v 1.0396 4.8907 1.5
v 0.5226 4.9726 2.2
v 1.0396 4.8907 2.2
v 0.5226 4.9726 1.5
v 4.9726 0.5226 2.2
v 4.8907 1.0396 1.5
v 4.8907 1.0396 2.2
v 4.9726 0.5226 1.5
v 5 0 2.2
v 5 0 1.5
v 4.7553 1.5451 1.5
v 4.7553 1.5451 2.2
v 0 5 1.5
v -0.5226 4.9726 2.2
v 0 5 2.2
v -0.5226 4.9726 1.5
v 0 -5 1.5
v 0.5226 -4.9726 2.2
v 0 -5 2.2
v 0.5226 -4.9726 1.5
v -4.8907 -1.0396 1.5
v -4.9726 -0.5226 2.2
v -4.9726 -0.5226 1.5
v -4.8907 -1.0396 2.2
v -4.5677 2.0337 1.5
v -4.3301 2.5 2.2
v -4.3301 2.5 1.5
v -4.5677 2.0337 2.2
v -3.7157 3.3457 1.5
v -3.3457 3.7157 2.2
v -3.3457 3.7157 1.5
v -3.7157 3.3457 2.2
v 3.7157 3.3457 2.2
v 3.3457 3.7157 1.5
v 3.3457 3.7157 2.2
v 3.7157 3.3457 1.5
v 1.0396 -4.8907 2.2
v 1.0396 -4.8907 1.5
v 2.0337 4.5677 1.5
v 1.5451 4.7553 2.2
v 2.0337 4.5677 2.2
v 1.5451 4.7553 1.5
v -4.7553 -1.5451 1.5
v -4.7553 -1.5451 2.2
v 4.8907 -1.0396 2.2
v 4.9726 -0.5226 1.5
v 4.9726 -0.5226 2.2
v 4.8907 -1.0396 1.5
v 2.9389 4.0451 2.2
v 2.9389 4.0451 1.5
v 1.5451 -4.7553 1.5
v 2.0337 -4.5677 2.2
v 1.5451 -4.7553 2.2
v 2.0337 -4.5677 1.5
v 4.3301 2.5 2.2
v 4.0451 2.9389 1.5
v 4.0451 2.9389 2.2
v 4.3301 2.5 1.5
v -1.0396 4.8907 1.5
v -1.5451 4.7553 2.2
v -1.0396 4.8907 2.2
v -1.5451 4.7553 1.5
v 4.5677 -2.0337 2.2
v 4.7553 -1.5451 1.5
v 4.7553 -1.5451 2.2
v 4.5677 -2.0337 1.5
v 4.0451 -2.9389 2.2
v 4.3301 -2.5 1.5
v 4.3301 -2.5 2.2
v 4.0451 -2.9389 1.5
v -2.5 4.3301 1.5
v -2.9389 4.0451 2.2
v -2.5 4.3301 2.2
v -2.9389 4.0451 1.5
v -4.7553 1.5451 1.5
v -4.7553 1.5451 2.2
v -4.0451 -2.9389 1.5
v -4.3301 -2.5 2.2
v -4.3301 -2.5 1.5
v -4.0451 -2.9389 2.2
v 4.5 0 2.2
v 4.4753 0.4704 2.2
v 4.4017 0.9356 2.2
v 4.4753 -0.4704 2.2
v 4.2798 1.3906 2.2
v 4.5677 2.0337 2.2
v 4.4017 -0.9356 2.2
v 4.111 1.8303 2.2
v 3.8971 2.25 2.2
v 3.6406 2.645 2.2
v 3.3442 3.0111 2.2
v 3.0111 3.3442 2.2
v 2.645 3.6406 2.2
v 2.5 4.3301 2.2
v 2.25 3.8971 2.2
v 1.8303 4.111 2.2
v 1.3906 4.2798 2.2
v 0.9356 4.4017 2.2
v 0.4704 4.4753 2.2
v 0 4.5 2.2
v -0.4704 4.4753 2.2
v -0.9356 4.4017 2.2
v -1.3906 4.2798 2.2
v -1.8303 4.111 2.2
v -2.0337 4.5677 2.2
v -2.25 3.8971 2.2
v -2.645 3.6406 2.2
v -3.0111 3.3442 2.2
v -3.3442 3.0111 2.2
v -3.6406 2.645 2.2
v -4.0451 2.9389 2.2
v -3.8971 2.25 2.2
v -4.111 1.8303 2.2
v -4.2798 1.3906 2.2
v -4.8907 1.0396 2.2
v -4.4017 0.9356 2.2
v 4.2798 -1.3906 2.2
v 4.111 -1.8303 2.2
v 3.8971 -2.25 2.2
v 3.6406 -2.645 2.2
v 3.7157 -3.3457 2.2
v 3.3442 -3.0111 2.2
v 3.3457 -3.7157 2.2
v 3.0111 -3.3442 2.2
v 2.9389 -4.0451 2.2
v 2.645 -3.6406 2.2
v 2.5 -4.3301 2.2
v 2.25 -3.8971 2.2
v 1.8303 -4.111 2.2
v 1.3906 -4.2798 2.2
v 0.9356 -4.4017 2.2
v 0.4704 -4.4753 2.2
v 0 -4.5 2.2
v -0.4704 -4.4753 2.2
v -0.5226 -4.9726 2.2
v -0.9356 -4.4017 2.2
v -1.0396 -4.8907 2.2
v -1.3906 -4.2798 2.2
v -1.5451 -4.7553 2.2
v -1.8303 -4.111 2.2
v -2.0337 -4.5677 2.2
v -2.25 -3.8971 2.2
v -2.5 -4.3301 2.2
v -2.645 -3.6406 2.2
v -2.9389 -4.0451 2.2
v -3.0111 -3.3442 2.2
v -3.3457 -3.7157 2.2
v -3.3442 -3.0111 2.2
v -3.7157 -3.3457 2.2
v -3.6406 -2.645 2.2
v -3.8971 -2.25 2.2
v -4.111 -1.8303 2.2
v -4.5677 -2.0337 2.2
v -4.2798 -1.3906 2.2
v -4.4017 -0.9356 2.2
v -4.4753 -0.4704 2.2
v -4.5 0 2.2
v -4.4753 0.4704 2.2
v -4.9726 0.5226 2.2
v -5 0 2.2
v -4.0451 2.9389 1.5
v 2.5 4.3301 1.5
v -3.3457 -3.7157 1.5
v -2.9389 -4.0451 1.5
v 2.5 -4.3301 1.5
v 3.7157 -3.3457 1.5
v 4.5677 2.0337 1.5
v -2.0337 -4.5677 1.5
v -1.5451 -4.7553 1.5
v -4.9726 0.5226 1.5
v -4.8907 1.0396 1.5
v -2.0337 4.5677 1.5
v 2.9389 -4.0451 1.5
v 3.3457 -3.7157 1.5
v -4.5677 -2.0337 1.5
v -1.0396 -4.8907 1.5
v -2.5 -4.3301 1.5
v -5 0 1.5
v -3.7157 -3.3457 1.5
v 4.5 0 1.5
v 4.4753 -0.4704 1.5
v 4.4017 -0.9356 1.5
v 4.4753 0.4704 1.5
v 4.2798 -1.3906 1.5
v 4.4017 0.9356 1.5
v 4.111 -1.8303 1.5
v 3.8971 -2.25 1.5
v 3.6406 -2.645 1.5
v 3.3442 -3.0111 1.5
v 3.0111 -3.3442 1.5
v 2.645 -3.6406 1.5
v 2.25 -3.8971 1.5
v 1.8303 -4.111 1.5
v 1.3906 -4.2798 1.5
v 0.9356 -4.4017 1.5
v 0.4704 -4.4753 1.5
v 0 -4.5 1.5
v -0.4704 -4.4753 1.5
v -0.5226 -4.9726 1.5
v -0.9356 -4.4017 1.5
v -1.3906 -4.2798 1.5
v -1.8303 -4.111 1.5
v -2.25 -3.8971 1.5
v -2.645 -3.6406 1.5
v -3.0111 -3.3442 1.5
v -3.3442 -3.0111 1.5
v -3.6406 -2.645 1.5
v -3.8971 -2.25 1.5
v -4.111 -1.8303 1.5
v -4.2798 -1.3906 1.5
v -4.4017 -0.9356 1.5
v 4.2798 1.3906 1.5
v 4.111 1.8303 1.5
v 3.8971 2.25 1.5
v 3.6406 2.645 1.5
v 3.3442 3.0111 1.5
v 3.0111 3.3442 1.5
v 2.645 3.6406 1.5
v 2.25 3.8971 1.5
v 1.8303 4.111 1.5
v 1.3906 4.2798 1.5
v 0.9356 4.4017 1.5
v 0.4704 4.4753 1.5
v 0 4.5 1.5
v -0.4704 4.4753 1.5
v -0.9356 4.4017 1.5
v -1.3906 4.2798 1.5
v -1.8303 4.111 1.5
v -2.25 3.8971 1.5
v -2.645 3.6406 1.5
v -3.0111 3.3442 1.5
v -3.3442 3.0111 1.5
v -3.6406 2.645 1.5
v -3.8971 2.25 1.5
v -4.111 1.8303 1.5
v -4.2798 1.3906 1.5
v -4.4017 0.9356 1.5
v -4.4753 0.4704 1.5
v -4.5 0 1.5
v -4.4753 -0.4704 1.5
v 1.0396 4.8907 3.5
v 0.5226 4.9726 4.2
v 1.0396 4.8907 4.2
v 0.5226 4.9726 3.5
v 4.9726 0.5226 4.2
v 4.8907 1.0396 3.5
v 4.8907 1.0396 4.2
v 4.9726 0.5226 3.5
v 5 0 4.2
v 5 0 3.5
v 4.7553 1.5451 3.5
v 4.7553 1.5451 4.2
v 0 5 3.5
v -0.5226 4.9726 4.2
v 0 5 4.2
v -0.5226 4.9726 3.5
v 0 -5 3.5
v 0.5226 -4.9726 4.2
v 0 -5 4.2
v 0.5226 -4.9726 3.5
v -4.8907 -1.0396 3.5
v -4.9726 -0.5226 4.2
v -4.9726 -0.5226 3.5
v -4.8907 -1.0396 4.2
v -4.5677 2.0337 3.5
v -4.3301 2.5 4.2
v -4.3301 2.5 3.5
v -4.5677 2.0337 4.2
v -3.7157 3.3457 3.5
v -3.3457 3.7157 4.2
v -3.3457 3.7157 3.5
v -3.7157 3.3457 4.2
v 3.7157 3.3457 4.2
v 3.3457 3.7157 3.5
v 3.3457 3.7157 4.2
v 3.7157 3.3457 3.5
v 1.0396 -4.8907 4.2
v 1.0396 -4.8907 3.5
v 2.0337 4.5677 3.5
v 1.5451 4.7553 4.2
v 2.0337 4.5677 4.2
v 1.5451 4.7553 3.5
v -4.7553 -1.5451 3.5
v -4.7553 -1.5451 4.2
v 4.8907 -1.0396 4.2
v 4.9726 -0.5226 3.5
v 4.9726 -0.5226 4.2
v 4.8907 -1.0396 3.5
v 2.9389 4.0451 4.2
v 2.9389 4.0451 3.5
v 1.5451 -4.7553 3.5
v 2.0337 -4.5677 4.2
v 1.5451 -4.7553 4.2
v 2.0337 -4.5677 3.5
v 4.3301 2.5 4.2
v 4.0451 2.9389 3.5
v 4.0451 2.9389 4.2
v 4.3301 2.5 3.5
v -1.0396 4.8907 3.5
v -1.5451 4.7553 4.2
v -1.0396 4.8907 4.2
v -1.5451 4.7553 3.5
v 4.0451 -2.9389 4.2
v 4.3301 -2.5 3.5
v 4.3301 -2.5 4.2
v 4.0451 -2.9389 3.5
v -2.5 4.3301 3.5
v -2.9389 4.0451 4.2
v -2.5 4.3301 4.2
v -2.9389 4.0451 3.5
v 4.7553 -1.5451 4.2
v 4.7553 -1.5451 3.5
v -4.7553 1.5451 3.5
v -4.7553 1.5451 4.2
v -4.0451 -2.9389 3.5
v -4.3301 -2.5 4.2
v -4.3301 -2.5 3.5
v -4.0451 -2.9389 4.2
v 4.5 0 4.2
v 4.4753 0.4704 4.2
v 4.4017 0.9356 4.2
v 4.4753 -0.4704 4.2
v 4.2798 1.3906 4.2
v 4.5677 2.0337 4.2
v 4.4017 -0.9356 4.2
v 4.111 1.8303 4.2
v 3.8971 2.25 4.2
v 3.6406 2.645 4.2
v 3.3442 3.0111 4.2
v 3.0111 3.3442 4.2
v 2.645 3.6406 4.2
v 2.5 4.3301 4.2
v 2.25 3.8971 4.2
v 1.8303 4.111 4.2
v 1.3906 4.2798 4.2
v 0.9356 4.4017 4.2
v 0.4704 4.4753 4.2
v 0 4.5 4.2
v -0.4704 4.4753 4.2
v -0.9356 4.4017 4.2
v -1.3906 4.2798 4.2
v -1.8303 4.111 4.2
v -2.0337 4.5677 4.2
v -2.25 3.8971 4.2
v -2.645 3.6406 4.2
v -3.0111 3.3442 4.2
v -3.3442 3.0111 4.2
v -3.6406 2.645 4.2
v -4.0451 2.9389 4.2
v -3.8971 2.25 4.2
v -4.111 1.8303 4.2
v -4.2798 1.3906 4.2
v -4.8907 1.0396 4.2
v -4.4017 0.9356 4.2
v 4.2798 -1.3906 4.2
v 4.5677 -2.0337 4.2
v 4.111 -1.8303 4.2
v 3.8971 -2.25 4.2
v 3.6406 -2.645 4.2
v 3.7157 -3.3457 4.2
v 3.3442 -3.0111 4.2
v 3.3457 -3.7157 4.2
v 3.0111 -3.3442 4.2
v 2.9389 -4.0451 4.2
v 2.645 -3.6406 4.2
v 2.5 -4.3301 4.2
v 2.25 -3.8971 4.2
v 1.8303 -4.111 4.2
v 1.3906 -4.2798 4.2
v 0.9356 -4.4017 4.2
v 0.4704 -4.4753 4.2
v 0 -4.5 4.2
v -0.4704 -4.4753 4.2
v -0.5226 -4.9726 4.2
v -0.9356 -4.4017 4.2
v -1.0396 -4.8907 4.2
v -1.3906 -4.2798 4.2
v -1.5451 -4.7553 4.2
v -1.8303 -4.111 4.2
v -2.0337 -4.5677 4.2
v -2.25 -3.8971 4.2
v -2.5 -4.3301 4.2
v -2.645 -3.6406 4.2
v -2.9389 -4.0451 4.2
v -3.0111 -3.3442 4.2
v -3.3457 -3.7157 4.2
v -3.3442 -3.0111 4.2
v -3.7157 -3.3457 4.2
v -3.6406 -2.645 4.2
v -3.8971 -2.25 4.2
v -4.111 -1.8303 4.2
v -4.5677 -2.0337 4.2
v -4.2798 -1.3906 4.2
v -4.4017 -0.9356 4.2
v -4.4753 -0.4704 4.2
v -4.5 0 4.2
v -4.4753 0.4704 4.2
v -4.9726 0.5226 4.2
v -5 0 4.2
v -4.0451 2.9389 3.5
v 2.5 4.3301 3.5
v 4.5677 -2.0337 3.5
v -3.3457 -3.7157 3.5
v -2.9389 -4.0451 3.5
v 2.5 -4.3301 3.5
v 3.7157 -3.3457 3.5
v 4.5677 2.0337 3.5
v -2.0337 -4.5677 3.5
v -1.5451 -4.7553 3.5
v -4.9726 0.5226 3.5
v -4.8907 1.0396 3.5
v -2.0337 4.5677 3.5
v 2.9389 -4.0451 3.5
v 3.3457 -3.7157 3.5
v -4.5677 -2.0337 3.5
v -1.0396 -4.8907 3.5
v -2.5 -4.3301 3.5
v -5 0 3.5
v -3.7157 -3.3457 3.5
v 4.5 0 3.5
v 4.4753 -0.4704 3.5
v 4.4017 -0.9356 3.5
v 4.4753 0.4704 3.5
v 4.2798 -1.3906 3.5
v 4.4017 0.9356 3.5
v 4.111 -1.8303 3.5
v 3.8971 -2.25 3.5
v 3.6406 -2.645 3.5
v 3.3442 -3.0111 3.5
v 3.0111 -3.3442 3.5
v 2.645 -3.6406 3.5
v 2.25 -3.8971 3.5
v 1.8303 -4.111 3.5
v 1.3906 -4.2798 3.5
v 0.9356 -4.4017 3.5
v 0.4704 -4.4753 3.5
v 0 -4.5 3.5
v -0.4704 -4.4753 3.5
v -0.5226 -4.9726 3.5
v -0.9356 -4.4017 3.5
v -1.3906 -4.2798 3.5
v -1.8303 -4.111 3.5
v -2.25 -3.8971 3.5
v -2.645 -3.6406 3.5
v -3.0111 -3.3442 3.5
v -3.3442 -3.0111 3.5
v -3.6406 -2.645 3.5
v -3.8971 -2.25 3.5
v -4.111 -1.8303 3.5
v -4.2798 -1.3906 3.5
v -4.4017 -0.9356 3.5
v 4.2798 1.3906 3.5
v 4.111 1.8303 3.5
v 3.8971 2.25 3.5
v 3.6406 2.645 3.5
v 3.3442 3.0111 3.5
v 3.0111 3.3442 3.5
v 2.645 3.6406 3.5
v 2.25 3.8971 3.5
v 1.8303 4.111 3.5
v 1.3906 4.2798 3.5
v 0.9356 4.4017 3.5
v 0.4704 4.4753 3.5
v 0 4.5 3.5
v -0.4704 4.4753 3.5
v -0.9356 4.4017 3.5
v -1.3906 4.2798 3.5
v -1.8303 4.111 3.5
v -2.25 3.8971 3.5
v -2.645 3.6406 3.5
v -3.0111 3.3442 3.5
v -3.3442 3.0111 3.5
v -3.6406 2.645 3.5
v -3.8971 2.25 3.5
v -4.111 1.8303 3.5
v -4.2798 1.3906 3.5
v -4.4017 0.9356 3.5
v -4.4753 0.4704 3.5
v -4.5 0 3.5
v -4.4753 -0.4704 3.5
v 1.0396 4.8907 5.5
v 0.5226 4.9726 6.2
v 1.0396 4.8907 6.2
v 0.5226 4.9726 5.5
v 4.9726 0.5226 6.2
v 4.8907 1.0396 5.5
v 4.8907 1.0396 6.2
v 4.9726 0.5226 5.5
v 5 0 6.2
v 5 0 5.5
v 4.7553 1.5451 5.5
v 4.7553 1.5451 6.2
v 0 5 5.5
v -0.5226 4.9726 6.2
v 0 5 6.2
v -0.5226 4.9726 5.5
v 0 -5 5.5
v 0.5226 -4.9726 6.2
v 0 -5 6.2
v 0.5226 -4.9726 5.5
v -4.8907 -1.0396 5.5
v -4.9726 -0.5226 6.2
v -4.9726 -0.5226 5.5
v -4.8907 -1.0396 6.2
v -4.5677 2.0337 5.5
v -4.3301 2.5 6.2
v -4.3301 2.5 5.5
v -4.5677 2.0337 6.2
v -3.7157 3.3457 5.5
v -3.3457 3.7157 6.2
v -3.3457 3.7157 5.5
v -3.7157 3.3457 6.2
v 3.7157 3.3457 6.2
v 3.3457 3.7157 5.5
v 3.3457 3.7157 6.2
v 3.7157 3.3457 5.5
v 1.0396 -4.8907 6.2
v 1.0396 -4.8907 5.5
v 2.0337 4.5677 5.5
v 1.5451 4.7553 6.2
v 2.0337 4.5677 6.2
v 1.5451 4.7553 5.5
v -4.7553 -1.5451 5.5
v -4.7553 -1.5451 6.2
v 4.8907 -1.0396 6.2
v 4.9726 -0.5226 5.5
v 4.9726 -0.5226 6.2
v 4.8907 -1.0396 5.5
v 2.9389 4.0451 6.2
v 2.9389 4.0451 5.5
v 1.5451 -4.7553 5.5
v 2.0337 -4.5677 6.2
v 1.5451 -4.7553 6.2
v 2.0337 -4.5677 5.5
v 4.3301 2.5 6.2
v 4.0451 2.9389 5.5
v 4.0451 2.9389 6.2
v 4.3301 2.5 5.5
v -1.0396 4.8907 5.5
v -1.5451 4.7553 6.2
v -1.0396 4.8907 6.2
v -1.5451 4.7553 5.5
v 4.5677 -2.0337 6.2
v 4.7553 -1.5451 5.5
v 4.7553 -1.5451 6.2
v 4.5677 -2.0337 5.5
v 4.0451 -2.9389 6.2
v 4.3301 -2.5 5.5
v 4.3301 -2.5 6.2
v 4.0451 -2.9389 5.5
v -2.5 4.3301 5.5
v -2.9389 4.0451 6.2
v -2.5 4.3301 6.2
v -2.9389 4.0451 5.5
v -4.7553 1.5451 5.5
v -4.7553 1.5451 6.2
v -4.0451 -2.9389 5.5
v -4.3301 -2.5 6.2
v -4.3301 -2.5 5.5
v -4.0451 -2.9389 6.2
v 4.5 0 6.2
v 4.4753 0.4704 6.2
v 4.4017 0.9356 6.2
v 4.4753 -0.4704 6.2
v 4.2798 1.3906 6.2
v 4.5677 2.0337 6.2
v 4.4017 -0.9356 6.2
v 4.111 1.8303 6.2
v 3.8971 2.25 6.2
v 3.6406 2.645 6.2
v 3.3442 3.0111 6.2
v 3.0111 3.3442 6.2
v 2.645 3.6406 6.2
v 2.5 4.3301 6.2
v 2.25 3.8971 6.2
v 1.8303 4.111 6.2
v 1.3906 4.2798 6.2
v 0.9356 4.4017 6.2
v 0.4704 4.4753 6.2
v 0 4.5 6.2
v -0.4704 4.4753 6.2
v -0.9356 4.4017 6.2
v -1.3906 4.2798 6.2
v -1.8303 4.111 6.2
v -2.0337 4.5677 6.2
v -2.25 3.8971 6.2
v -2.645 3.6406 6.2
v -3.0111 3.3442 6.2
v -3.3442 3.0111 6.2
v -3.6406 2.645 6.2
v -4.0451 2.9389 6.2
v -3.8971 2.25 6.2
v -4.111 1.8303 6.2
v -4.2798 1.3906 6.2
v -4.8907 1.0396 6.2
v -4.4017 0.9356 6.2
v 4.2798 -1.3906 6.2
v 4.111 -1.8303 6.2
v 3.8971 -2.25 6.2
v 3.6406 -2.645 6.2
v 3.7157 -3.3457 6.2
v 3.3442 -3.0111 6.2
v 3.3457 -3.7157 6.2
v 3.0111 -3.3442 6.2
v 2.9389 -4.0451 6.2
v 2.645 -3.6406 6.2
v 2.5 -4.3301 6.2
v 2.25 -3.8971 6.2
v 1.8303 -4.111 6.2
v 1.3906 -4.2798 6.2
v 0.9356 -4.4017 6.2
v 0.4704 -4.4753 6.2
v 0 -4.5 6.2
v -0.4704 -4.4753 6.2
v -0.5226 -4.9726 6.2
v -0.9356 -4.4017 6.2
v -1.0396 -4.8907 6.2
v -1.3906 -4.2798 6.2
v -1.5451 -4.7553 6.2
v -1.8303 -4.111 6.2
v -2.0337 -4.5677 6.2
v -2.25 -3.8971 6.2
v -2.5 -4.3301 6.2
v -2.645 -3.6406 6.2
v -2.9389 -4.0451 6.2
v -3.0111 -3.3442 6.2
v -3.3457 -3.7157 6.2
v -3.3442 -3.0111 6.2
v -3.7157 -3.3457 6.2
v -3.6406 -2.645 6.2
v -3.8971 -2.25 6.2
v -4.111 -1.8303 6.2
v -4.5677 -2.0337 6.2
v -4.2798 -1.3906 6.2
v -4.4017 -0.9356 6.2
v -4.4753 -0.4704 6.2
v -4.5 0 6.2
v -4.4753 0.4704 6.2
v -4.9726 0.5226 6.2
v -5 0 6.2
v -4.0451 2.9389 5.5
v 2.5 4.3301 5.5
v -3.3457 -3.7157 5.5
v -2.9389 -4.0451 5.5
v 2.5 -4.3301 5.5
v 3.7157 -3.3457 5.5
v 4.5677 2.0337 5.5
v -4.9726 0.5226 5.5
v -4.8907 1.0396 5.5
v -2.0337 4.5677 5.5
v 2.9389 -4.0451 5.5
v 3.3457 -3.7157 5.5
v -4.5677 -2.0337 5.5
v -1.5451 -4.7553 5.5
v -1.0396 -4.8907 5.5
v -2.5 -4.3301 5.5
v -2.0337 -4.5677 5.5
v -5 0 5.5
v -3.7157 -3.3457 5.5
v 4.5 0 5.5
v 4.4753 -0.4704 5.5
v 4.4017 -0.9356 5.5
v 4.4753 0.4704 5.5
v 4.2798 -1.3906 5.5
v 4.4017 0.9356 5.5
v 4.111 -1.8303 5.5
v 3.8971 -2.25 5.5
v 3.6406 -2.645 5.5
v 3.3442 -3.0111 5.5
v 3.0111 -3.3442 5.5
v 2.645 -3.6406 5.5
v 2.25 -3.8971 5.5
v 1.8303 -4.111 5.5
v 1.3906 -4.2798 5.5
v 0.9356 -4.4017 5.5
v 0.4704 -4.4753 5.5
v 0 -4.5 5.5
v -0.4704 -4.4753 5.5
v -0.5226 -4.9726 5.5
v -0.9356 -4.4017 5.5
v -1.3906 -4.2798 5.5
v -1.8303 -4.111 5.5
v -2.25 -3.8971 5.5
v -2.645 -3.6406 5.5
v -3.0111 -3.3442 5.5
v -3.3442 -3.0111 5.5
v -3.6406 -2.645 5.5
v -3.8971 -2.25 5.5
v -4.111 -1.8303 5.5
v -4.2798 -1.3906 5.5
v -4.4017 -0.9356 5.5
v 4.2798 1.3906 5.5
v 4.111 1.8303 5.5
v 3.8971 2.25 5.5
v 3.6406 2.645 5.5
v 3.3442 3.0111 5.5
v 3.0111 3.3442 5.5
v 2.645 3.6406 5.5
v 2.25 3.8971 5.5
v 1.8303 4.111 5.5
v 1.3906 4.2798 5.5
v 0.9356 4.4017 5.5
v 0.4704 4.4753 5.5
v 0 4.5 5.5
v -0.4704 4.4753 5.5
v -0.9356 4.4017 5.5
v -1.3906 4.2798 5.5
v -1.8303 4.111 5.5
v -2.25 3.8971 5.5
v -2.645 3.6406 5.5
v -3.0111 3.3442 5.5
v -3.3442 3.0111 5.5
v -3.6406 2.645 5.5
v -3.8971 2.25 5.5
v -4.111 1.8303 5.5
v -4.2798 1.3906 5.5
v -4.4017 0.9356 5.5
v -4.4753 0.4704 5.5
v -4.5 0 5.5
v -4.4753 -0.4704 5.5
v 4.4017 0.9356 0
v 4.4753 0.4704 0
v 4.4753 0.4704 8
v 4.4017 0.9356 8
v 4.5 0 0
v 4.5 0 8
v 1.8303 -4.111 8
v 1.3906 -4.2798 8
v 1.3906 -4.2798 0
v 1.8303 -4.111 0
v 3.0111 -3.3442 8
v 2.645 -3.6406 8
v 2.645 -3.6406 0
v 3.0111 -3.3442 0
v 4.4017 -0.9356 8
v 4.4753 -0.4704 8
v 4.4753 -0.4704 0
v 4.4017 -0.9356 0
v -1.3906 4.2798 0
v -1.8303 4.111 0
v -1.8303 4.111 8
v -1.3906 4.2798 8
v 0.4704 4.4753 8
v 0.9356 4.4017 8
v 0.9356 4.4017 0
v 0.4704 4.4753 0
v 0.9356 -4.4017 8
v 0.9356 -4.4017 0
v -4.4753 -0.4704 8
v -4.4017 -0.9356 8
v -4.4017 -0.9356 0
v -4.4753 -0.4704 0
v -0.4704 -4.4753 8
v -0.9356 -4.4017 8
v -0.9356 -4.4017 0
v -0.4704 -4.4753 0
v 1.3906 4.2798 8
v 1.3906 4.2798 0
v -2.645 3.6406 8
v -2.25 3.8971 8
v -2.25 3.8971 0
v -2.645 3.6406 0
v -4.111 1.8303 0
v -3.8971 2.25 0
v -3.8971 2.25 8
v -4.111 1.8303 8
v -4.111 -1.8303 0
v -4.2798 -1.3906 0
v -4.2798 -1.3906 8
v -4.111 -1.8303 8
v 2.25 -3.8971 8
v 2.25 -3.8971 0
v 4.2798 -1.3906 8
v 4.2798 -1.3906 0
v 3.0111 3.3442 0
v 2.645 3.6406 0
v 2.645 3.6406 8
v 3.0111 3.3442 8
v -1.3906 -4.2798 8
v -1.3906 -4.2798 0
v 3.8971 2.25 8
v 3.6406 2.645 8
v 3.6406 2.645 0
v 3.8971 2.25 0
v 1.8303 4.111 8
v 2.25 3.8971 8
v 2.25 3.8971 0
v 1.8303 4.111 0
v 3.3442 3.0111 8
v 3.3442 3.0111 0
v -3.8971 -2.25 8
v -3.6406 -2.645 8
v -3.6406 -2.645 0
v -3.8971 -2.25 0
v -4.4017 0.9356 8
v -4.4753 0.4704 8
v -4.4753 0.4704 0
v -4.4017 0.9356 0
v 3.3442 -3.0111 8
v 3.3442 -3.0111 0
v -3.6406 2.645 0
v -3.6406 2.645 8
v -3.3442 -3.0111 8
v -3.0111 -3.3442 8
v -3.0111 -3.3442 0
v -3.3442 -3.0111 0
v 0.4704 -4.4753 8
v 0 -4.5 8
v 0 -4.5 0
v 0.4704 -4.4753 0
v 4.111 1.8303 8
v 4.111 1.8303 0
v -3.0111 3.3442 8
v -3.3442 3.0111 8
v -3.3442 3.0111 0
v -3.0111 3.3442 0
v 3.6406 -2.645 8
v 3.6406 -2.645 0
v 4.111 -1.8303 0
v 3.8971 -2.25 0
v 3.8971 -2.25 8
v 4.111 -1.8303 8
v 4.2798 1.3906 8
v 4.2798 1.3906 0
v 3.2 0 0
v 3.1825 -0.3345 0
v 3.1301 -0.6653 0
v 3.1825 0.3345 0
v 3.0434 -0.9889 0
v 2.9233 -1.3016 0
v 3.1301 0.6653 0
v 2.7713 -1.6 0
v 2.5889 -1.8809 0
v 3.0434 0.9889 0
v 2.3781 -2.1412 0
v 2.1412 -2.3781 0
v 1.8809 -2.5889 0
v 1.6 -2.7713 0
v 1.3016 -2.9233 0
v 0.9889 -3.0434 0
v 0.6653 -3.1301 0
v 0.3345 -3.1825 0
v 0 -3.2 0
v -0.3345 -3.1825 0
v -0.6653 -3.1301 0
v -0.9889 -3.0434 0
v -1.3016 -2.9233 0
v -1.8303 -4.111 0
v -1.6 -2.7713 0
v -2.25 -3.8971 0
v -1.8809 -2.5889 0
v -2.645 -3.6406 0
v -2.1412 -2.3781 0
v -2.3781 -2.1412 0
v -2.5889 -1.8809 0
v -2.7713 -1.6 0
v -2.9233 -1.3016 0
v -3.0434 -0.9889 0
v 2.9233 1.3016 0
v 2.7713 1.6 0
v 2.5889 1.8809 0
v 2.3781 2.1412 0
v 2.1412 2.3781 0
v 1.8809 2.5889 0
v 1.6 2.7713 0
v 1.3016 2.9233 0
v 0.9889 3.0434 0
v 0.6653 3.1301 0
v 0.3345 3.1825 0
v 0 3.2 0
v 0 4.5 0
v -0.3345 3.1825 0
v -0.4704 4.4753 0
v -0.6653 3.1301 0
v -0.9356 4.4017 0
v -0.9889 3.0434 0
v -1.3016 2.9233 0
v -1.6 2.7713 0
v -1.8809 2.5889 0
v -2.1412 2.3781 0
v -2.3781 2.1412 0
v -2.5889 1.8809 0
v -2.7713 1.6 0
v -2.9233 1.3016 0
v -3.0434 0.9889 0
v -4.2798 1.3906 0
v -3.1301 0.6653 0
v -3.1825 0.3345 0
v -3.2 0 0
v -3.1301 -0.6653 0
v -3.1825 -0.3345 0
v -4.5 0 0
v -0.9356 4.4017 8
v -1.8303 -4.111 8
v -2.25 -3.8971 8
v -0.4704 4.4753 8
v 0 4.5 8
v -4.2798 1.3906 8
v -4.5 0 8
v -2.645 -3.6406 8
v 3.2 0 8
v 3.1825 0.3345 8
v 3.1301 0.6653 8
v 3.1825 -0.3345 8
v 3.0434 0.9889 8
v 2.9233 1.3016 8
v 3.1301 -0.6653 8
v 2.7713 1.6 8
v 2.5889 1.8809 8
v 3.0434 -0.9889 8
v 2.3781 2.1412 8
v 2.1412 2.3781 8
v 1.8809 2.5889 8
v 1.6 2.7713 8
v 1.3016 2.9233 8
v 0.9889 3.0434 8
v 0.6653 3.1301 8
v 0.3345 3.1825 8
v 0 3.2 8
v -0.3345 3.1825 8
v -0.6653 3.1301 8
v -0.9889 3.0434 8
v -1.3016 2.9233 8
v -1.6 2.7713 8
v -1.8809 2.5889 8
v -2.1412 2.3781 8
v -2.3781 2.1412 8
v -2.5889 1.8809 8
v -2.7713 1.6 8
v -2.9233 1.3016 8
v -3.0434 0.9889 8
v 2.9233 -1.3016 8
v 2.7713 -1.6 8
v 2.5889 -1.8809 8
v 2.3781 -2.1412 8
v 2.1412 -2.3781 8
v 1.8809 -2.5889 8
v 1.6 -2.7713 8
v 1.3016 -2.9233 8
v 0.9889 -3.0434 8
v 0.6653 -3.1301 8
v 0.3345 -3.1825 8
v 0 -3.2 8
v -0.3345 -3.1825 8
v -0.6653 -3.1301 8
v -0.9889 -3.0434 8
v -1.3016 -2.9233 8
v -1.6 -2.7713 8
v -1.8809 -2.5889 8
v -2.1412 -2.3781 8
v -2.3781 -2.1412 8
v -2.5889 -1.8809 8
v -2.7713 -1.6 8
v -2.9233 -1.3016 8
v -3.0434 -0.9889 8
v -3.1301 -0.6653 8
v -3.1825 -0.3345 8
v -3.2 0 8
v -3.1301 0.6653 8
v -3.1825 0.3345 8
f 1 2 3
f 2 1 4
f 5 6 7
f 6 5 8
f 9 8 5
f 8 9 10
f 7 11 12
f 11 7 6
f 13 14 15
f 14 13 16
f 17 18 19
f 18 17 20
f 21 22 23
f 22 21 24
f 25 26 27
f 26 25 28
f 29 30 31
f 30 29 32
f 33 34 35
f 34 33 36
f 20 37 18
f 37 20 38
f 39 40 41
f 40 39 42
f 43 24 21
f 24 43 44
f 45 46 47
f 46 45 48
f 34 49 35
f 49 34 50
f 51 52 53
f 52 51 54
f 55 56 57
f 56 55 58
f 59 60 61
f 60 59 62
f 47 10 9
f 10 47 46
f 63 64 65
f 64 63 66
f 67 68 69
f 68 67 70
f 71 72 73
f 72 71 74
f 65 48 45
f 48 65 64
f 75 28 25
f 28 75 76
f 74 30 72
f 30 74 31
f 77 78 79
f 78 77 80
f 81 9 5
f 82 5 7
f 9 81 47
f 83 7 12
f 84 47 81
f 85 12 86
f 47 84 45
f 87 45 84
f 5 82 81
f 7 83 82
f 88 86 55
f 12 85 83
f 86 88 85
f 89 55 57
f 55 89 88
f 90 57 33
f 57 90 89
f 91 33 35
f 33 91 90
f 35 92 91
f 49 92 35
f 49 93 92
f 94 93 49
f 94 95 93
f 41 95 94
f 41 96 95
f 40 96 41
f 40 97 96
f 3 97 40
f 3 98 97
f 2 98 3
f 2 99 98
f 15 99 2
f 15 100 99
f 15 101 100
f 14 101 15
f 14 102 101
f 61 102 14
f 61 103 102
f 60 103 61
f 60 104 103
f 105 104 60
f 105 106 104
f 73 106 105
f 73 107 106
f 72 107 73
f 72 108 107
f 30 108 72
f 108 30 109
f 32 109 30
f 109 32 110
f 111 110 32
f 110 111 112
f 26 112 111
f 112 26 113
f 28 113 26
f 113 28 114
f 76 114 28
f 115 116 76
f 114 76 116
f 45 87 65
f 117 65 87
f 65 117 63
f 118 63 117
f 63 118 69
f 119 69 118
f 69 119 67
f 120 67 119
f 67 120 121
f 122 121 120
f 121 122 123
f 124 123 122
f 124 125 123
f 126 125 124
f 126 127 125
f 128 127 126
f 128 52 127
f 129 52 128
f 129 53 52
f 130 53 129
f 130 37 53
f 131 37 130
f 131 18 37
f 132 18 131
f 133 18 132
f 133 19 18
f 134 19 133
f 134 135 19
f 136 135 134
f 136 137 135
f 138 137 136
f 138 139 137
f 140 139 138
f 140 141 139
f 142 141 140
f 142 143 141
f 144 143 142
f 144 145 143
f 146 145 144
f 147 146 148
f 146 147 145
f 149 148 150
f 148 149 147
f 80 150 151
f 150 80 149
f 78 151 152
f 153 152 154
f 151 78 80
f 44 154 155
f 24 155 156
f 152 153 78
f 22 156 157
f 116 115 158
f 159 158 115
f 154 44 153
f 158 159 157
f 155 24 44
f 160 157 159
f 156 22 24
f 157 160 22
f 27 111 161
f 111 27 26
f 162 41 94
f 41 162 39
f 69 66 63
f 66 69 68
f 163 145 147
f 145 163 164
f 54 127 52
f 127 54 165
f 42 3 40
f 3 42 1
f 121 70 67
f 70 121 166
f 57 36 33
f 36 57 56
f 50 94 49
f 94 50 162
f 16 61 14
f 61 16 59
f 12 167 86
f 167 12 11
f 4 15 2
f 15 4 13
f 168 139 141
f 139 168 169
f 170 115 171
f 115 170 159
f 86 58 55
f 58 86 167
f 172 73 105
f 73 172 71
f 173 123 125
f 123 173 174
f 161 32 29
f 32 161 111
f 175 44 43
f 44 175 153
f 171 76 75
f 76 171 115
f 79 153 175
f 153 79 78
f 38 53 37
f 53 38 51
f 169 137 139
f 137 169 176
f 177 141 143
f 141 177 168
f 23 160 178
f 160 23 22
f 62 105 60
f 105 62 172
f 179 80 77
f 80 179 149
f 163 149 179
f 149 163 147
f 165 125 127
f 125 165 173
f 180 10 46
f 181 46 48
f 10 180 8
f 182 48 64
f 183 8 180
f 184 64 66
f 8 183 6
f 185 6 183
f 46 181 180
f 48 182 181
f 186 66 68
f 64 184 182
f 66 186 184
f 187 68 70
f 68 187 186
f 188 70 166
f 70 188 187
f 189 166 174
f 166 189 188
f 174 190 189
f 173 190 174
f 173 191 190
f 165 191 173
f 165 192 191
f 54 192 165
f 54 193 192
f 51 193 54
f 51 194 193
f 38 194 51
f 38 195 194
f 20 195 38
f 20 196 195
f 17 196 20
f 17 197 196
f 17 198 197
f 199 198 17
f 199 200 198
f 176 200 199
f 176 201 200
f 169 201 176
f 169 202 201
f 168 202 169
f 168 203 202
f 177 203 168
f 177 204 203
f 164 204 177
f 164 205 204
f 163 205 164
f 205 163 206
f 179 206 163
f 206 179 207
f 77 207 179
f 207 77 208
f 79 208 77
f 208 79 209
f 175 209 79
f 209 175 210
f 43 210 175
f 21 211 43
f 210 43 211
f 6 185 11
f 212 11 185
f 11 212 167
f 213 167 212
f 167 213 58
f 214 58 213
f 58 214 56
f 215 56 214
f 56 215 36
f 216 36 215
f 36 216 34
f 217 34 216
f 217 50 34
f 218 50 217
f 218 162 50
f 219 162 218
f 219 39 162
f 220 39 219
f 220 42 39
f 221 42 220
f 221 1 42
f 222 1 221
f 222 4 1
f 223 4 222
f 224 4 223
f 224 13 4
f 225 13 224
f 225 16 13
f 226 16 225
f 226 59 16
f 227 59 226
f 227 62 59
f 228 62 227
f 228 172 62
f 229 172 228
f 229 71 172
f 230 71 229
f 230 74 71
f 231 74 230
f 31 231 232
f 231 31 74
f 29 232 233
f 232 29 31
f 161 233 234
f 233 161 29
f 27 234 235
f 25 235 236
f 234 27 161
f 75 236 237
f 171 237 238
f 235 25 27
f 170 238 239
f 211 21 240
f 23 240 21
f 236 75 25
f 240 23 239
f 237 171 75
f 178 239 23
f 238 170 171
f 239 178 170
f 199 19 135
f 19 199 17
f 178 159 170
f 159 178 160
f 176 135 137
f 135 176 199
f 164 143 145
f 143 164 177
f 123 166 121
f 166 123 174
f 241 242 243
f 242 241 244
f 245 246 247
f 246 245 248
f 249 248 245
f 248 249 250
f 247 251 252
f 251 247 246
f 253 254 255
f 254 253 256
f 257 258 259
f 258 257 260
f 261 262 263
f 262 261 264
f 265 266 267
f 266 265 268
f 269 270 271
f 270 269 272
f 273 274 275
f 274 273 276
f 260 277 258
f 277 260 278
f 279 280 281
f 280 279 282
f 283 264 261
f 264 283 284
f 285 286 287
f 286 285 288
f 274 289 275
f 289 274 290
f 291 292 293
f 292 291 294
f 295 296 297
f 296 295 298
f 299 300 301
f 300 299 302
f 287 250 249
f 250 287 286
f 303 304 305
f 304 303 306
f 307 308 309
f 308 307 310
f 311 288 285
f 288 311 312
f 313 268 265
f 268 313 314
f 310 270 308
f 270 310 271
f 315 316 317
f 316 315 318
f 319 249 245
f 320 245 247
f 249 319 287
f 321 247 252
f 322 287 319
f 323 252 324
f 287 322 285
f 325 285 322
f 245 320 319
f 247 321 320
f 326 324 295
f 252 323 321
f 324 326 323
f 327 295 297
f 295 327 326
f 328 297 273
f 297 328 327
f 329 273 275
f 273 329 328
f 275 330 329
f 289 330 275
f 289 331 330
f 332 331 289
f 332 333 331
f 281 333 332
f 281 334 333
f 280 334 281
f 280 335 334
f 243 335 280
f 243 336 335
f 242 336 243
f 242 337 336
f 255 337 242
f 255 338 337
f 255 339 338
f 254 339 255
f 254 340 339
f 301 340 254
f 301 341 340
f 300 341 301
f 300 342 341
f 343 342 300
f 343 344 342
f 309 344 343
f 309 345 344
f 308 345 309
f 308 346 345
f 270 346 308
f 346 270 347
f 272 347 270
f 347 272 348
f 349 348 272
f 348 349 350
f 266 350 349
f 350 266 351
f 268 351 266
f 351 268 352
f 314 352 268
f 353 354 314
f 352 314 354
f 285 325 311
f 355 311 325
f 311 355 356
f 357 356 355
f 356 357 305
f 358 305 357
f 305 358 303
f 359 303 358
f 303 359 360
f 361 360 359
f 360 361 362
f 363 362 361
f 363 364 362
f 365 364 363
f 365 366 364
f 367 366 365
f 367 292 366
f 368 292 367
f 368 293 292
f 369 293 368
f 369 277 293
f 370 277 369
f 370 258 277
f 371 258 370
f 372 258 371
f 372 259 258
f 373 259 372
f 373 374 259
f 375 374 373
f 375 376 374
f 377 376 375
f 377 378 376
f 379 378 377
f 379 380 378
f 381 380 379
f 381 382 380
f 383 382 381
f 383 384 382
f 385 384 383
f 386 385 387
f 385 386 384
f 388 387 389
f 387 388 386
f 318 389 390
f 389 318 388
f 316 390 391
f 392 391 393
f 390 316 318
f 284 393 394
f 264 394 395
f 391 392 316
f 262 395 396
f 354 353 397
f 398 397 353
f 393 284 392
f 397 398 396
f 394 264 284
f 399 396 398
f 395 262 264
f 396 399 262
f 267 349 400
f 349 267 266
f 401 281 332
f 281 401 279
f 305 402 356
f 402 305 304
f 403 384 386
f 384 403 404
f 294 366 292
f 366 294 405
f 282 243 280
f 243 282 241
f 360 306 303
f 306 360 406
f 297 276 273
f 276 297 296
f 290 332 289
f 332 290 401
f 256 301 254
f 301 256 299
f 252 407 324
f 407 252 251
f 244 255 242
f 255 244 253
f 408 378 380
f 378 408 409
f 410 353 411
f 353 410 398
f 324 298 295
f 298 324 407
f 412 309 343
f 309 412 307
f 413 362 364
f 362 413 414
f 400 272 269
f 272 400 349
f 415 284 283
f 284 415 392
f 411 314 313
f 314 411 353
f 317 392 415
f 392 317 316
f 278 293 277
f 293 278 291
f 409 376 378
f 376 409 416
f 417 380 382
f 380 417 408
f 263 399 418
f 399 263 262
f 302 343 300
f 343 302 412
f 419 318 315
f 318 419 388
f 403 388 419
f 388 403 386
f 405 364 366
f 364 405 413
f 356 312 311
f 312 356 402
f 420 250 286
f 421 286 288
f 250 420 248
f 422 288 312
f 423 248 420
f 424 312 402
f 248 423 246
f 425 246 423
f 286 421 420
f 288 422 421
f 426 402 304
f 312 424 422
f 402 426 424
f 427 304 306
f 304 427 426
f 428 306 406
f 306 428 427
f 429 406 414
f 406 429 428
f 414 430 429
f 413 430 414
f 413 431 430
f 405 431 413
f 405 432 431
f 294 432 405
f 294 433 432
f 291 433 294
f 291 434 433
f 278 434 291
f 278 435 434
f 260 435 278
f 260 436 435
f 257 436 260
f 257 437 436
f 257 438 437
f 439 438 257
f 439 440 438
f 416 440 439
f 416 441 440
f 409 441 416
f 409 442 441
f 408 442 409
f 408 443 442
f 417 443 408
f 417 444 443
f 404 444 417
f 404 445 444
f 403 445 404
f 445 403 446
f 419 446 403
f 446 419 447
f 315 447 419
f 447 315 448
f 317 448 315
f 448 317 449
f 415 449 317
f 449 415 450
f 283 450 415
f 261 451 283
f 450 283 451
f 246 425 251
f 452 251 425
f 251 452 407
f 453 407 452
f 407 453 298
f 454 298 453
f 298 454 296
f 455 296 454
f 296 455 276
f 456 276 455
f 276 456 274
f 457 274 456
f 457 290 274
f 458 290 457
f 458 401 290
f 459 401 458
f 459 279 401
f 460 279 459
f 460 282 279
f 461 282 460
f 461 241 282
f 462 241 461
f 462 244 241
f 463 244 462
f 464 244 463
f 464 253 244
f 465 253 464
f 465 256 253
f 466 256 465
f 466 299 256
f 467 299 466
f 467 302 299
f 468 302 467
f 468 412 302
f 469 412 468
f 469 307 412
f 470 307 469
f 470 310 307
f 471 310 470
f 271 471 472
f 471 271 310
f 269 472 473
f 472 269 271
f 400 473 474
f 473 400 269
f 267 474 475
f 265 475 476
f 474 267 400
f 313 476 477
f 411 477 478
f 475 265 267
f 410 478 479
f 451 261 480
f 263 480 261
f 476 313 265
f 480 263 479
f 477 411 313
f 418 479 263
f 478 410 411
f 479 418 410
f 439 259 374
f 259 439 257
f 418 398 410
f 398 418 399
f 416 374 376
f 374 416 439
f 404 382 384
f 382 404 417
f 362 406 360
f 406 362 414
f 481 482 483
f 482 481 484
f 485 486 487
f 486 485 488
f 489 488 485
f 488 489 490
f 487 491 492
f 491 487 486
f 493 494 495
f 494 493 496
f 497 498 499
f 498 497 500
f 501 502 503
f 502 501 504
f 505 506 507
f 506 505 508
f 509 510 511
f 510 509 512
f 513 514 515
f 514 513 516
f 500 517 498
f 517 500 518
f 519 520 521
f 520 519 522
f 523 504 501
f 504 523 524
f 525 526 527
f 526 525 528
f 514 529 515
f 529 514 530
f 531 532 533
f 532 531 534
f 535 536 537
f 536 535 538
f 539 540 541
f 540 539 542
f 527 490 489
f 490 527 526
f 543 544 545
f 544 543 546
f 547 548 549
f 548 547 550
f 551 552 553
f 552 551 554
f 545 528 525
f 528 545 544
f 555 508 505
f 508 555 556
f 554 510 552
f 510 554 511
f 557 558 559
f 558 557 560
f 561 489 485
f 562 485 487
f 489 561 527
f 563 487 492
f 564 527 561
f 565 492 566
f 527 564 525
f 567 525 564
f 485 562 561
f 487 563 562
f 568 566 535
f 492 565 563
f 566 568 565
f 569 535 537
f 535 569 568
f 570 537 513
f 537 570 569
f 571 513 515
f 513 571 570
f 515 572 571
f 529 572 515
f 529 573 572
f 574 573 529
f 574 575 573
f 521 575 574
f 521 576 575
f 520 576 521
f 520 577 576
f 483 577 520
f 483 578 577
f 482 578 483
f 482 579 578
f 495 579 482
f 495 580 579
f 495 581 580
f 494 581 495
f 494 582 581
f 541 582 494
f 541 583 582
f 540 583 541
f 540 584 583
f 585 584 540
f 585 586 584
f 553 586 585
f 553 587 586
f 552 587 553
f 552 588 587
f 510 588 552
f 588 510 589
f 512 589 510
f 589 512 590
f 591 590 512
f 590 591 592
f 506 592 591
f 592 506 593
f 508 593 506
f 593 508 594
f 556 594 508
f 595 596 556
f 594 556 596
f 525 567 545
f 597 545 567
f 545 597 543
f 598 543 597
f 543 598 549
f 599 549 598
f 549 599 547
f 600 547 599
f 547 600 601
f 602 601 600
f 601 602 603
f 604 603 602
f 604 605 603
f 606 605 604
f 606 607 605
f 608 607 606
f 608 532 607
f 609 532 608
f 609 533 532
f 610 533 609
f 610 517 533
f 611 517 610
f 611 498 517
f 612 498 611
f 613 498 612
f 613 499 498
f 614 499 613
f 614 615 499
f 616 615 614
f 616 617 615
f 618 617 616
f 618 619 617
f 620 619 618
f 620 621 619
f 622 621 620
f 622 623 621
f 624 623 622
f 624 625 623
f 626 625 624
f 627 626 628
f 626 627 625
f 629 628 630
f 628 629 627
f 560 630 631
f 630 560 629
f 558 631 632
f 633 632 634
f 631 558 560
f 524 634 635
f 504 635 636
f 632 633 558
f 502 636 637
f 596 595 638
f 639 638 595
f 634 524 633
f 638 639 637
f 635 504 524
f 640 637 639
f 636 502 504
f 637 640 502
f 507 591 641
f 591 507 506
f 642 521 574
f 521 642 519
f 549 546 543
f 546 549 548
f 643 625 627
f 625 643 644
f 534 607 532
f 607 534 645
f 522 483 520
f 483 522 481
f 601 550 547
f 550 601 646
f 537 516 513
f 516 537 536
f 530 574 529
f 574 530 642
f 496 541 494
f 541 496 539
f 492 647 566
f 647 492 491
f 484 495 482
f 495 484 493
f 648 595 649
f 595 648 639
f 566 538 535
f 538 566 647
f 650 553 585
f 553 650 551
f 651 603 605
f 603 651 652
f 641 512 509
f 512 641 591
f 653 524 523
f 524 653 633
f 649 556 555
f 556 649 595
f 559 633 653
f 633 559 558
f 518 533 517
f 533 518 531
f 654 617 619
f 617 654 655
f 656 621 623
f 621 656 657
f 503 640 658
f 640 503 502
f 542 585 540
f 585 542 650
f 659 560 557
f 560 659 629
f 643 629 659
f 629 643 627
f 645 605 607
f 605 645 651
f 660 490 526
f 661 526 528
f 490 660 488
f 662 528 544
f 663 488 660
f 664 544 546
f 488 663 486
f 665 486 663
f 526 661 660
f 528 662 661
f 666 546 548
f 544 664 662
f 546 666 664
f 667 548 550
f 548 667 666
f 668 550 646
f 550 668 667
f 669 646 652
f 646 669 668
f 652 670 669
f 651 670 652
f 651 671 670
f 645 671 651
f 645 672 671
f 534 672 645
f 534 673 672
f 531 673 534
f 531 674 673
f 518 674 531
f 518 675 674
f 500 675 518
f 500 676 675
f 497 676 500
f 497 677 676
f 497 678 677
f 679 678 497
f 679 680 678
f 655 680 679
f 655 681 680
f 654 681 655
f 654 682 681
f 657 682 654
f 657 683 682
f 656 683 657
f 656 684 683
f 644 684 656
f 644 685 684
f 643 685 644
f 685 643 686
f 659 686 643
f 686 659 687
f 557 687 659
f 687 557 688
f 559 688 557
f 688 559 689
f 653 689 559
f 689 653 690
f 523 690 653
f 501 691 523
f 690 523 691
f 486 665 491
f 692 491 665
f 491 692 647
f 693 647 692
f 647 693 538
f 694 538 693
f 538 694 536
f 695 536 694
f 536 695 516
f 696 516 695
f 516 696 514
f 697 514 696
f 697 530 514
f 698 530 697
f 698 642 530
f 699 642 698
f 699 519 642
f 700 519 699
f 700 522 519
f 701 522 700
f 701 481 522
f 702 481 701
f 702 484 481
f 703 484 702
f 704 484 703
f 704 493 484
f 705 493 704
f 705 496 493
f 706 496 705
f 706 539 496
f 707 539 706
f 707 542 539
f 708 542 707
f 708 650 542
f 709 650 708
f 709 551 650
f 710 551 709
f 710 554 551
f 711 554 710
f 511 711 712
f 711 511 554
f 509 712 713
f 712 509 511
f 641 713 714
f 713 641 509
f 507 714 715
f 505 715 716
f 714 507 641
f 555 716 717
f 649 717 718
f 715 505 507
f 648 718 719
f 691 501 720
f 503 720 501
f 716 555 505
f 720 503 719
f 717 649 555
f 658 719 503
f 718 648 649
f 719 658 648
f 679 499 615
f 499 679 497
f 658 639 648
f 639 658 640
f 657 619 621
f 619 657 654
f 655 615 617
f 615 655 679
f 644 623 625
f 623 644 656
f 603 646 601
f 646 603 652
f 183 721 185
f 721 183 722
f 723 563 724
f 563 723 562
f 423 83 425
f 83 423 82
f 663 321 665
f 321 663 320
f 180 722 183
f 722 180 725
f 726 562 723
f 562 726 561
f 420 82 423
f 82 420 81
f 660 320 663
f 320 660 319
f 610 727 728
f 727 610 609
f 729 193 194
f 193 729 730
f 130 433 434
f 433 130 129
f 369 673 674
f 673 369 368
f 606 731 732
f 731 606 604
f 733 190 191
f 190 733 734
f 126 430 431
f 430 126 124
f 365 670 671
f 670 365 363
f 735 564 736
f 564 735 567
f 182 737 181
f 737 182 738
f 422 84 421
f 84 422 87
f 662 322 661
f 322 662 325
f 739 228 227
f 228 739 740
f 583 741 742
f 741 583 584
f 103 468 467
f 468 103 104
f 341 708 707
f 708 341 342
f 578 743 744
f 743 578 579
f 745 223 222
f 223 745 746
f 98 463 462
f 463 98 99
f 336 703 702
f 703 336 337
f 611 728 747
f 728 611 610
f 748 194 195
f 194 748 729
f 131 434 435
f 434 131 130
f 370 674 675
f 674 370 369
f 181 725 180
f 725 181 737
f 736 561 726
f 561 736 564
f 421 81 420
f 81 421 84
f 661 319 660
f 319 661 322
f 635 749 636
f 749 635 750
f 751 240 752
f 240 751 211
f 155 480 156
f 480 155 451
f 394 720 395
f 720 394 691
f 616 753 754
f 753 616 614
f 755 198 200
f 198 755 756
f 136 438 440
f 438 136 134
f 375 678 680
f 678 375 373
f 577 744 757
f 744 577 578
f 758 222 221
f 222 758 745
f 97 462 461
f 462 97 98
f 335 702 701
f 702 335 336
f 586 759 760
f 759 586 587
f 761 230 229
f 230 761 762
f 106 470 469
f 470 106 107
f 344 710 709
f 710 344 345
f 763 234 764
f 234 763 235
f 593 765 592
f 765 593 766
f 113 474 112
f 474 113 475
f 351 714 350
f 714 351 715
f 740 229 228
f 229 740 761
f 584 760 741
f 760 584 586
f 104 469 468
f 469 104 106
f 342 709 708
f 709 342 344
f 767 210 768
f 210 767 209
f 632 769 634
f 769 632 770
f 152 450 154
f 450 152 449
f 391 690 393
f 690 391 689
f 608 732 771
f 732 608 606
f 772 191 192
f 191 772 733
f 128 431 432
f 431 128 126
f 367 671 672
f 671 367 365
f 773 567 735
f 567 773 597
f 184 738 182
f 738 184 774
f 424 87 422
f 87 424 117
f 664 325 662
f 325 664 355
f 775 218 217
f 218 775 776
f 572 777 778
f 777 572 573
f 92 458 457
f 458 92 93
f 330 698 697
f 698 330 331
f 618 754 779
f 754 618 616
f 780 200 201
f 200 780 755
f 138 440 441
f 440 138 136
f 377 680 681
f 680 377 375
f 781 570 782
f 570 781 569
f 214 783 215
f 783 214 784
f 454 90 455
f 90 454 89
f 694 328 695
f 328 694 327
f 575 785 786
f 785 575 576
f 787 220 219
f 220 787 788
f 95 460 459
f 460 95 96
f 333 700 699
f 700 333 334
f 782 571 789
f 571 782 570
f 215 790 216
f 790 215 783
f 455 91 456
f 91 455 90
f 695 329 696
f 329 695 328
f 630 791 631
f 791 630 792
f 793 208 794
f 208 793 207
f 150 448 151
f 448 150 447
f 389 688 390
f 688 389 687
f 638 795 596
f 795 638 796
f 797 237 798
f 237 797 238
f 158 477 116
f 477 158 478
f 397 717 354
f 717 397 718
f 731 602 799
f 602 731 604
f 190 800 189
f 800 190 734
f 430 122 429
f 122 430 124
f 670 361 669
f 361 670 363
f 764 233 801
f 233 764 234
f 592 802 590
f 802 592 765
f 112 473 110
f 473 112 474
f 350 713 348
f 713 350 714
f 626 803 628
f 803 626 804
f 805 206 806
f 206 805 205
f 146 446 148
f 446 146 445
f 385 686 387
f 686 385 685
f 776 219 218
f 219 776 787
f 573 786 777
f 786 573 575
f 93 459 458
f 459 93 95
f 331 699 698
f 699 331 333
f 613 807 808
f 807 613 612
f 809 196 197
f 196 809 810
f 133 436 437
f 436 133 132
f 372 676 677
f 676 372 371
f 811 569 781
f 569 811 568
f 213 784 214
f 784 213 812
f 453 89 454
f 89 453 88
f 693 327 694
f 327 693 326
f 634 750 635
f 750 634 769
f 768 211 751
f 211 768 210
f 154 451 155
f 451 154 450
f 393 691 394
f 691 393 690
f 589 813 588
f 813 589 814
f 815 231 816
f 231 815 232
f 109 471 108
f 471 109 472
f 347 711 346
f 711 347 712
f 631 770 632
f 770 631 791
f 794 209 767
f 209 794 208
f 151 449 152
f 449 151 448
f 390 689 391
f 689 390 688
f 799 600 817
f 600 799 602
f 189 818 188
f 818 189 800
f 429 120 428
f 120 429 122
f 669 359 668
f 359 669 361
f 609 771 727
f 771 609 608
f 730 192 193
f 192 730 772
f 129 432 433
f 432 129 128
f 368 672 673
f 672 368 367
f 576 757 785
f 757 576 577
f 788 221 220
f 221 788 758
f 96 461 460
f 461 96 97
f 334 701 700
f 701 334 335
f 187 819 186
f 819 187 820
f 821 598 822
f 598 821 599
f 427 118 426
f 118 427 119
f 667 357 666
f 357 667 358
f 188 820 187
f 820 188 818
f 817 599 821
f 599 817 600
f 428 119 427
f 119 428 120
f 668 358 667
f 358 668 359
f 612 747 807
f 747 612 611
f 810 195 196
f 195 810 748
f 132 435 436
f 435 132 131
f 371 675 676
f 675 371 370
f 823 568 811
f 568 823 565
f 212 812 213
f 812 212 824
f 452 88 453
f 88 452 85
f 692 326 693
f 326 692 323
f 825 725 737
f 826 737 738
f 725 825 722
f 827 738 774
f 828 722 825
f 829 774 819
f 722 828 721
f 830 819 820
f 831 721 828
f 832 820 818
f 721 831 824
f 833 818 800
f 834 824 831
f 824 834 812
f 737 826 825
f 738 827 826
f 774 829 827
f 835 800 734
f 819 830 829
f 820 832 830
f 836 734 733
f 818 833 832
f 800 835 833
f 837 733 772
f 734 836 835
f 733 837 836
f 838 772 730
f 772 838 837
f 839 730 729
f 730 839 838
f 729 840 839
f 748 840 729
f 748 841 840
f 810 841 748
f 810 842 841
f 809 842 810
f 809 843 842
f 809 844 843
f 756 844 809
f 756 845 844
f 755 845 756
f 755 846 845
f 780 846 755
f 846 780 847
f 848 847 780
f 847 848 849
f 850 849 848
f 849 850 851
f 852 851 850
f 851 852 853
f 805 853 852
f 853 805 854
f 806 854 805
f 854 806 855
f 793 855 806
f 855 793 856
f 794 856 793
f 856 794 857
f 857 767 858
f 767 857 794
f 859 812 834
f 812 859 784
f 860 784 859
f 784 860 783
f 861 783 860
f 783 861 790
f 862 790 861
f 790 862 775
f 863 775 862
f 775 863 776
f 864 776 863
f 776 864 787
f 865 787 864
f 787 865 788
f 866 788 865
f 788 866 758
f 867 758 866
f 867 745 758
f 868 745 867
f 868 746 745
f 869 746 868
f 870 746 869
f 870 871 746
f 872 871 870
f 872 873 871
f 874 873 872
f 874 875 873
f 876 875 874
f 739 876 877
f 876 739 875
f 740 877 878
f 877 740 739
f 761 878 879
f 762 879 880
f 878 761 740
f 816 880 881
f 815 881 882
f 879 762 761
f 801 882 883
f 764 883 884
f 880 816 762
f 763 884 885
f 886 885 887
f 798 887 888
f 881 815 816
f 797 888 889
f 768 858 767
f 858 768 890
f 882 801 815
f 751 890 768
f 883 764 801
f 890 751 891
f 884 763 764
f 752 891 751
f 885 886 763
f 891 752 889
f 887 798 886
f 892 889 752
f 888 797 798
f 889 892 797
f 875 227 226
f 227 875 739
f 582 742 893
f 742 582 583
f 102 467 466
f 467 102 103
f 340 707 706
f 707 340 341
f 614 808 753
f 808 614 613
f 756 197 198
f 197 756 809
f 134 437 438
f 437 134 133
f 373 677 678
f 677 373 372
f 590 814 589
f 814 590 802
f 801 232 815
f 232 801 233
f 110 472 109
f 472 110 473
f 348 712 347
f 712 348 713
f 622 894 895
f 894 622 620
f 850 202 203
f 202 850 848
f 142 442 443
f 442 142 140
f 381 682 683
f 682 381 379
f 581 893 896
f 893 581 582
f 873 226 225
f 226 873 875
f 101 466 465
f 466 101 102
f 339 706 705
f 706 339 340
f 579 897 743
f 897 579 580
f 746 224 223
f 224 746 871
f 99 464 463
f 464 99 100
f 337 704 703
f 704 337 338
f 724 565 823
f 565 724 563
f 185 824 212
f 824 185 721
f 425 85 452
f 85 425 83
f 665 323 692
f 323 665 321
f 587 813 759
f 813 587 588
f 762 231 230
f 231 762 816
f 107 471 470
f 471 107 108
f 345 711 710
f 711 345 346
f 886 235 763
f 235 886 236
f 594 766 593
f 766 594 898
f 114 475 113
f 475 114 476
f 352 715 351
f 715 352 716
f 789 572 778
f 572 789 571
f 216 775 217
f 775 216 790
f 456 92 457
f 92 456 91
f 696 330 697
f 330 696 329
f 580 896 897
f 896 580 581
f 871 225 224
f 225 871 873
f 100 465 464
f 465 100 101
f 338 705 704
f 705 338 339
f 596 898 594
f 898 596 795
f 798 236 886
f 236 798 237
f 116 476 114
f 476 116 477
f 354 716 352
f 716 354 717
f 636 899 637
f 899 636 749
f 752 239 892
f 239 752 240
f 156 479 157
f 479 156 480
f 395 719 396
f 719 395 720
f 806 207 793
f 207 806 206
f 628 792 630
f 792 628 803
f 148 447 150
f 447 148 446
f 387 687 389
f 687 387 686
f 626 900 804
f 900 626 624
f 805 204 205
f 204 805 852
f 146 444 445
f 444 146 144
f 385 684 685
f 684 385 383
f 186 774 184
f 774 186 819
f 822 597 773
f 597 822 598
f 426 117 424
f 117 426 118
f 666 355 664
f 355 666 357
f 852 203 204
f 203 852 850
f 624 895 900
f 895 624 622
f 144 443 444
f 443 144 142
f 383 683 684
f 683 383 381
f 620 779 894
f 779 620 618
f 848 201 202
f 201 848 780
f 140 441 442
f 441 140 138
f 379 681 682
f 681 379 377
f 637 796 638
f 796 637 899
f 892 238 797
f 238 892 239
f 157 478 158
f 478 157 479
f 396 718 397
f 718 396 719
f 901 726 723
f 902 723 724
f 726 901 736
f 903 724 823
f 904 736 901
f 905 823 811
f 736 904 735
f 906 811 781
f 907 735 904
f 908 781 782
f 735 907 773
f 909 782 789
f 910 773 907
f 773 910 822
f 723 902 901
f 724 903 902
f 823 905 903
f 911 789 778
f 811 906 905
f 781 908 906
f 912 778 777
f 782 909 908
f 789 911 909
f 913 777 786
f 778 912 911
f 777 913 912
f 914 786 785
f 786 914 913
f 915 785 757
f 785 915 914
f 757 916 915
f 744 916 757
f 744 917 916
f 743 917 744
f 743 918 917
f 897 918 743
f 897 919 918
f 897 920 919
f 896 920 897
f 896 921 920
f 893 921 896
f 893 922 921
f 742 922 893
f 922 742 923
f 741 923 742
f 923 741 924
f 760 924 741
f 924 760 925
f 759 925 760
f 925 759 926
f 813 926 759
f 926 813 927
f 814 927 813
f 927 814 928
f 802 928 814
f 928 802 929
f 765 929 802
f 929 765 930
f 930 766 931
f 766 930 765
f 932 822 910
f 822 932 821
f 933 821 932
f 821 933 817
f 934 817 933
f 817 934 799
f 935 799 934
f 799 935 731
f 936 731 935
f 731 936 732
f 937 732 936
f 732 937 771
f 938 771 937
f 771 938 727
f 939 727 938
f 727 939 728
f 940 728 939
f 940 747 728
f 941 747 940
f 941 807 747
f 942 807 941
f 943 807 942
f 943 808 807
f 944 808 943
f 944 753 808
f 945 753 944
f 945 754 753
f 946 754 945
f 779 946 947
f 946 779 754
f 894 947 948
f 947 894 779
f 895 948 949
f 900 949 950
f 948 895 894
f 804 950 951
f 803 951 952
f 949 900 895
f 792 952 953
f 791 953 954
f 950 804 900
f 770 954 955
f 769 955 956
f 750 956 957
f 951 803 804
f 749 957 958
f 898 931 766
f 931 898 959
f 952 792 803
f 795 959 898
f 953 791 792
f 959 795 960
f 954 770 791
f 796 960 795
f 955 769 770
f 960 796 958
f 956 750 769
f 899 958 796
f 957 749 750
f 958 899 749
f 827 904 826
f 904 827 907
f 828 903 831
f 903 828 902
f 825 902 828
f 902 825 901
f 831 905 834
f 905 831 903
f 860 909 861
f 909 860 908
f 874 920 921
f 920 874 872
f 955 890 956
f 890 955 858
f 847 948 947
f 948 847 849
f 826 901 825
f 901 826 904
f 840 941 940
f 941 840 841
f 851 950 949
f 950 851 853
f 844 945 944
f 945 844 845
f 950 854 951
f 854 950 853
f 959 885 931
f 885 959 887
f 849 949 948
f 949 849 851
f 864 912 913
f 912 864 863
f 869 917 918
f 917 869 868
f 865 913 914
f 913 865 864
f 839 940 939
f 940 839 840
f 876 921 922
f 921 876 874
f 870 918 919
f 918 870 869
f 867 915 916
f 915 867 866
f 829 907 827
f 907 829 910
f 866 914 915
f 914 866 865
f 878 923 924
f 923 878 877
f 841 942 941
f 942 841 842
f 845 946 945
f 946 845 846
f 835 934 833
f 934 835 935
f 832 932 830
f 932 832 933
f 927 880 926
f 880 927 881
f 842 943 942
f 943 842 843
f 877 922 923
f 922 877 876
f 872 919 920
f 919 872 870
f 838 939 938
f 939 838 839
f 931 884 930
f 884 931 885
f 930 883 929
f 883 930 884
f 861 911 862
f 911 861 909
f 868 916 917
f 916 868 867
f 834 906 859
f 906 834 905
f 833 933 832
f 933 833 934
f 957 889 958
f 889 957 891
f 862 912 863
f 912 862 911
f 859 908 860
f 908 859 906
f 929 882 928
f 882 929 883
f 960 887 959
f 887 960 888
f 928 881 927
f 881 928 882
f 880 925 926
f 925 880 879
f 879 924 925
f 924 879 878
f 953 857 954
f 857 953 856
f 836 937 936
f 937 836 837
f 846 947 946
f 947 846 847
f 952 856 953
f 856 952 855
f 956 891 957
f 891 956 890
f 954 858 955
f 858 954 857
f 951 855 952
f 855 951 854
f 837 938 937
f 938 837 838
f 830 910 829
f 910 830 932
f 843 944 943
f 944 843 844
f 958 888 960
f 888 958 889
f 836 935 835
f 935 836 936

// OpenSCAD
// Heat-set insert, simplified ribbed geometry.
$fn = 60;
eps = 0.02;
inner_d = 6.4;
outer_d = 9;
length = 8;
difference() {
    union() {
        cylinder(d=outer_d,h=length);
        for(z=[1.5:2:length-1]) translate([0,0,z]) cylinder(d=outer_d+1,h=0.7);
    }
    translate([0,0,-eps]) cylinder(d=inner_d,h=length+2*eps);
}
